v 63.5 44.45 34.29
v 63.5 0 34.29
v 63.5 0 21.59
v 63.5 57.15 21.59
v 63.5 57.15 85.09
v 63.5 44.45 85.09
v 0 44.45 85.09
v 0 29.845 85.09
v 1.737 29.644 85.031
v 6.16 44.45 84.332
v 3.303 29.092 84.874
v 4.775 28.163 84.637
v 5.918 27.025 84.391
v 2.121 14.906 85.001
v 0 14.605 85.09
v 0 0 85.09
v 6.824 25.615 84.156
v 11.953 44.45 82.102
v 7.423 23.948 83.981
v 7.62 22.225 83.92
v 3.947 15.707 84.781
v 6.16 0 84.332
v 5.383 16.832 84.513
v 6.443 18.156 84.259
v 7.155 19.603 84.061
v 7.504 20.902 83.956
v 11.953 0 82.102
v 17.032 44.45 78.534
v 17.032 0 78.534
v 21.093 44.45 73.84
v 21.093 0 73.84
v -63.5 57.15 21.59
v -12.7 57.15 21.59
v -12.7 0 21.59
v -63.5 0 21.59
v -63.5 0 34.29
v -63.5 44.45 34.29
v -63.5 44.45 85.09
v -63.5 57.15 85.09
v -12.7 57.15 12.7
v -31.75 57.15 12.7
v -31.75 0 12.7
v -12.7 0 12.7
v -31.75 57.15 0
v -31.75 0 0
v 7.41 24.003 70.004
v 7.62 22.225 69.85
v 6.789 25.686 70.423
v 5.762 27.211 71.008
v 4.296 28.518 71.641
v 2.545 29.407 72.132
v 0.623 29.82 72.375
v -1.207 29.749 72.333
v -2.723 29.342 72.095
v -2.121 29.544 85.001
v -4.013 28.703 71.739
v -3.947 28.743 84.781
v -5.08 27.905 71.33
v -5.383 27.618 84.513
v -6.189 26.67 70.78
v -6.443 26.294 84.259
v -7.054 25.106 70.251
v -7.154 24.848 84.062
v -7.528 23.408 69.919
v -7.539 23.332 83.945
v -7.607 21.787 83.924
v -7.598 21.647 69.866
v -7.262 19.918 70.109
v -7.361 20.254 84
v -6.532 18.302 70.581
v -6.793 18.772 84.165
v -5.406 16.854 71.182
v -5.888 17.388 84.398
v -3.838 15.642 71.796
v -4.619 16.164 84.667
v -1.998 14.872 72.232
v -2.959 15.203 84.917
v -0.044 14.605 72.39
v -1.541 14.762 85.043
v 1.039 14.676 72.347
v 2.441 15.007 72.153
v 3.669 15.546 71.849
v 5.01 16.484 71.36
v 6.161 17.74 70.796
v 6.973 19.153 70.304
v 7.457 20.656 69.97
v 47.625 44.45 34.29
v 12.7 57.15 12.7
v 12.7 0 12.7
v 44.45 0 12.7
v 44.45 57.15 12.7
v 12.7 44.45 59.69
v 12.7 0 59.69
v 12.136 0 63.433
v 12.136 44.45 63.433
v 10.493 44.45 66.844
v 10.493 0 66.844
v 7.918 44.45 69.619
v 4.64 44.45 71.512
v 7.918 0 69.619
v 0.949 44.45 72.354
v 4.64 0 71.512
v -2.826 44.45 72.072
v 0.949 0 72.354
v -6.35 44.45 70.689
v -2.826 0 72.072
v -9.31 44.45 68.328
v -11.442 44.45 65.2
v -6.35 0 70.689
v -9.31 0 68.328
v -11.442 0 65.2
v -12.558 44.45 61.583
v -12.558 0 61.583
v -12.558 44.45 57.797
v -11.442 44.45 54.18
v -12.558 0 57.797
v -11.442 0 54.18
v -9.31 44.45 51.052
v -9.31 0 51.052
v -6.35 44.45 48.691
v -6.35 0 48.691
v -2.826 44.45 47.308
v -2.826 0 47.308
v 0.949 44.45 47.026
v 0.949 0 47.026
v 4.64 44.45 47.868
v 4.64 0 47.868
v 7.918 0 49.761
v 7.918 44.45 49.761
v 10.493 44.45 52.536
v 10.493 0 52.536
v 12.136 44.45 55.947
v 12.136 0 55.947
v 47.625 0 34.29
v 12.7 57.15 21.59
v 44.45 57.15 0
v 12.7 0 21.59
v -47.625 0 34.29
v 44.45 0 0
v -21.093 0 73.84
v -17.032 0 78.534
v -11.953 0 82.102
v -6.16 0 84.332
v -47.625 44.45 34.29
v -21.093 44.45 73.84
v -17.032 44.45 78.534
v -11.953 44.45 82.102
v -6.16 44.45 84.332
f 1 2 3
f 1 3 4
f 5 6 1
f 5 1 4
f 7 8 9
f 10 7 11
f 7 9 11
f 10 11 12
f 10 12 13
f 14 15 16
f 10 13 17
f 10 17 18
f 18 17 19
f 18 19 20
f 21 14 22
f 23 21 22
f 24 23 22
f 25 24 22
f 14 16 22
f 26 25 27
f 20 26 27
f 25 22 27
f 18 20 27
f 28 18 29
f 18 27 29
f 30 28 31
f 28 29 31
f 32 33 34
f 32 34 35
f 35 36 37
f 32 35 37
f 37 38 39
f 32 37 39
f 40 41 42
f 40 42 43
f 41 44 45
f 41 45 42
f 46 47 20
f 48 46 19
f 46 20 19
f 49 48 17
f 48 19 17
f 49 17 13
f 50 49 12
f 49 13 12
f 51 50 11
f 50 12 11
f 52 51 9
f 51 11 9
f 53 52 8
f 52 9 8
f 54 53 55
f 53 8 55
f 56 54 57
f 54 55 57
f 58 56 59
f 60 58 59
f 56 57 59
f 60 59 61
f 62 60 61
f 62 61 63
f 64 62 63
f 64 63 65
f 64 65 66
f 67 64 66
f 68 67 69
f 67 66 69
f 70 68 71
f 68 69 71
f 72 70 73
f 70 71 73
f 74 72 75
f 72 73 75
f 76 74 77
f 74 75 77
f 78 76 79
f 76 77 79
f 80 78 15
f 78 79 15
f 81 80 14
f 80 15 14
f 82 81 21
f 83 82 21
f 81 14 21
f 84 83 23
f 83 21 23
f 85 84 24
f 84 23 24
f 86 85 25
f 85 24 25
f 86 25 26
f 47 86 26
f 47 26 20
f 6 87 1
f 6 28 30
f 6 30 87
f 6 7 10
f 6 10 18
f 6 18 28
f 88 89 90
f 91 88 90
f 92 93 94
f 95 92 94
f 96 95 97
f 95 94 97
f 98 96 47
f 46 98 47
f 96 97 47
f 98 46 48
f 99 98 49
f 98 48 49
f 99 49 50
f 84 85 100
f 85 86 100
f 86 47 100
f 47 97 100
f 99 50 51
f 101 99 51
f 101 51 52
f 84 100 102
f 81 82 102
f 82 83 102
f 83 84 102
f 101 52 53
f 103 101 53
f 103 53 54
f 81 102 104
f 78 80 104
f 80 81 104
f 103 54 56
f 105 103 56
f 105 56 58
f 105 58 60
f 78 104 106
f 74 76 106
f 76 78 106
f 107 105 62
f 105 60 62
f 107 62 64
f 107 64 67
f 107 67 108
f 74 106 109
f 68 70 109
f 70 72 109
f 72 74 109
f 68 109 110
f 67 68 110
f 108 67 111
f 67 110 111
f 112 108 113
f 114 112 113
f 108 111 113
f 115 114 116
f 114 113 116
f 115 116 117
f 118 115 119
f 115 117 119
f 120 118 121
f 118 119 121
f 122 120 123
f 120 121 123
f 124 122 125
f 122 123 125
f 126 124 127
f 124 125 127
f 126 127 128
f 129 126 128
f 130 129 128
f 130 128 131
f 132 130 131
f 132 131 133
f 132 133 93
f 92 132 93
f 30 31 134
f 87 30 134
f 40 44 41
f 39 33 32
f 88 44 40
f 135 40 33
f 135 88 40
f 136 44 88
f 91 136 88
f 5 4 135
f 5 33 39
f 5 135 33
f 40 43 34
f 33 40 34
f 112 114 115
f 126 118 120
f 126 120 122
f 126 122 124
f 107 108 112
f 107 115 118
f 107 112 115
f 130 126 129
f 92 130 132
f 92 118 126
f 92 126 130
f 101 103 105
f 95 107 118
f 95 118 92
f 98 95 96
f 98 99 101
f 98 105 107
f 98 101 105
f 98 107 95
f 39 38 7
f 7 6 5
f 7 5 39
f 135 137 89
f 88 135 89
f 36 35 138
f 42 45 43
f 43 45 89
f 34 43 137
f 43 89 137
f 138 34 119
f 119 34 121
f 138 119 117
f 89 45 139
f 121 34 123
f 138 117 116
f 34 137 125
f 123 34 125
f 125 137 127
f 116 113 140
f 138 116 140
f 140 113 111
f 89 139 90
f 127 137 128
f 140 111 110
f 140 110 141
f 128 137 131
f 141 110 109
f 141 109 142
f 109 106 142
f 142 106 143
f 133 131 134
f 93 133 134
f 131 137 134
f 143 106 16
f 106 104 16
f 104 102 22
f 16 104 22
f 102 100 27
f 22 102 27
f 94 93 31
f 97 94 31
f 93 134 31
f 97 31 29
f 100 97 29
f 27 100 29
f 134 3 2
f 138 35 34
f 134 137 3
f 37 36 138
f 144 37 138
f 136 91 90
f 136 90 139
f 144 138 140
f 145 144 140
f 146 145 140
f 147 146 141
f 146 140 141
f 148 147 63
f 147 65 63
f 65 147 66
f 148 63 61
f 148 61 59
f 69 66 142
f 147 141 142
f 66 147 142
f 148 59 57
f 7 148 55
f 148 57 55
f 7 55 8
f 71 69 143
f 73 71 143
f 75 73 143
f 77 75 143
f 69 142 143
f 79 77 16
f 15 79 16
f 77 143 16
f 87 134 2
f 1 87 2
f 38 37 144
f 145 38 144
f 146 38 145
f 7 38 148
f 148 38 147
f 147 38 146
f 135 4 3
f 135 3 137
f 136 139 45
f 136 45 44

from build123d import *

# Parameters (mm, degrees)
F0_W     = 57.15
F0_H     = 85.09
F1_DEPTH = 63.5
F2_R     = 12.7
F3_DEPTH = 44.45
F4_R     = 7.62
F5_DEPTH = 25.4
F6_DEPTH = 57.151


with BuildPart() as f1:
    # F0 (on Right) → F1 (new body, symmetric)
    with BuildSketch(Plane.YZ):
        with Locations((28.575, 42.545)):
            Rectangle(F0_W, F0_H)
    extrude(amount=F1_DEPTH, both=True)

    # F2 (on Front) → F3 (cut)
    with BuildSketch(Plane.XZ):
        with BuildLine():
            Line((-63.5, 85.09), (-63.5, 34.29))
            Line((-63.5, 34.29), (-47.625, 34.29))
            Line((-47.625, 34.29), (-21.093426, 73.840173))
            ThreePointArc((-21.093426, 73.840173), (-11.952941, 82.101765), (0, 85.09))
            Line((0, 85.09), (-63.5, 85.09))
        make_face()
        with BuildLine():
            Line((47.625, 34.29), (63.5, 34.29))
            Line((63.5, 34.29), (63.5, 85.09))
            Line((63.5, 85.09), (0, 85.09))
            ThreePointArc((0, 85.09), (11.952941, 82.101765), (21.093426, 73.840173))
            Line((21.093426, 73.840173), (47.625, 34.29))
        make_face()
        with Locations((0, 59.69)):
            Circle(F2_R)
    extrude(amount=-F3_DEPTH, mode=Mode.SUBTRACT)

    # F4 (on face) → F5 (cut)
    with BuildSketch(Plane.XY.offset(85.09)):
        with Locations((0, 22.225)):
            Circle(F4_R)
    extrude(amount=-F5_DEPTH, mode=Mode.SUBTRACT)

    # F2 (on Front) → F6 (cut, through all)
    with BuildSketch(Plane.XZ):
        Polygon((-63.5, 0), (-31.75, 0), (-31.75, 12.7), (-12.7, 12.7), (-12.7, 21.59), (-63.5, 21.59), align=None)
        Polygon((44.45, 12.7), (44.45, 0), (63.5, 0), (63.5, 21.59), (12.7, 21.59), (12.7, 12.7), align=None)
    extrude(amount=-F6_DEPTH, mode=Mode.SUBTRACT)


solid = f1.part
